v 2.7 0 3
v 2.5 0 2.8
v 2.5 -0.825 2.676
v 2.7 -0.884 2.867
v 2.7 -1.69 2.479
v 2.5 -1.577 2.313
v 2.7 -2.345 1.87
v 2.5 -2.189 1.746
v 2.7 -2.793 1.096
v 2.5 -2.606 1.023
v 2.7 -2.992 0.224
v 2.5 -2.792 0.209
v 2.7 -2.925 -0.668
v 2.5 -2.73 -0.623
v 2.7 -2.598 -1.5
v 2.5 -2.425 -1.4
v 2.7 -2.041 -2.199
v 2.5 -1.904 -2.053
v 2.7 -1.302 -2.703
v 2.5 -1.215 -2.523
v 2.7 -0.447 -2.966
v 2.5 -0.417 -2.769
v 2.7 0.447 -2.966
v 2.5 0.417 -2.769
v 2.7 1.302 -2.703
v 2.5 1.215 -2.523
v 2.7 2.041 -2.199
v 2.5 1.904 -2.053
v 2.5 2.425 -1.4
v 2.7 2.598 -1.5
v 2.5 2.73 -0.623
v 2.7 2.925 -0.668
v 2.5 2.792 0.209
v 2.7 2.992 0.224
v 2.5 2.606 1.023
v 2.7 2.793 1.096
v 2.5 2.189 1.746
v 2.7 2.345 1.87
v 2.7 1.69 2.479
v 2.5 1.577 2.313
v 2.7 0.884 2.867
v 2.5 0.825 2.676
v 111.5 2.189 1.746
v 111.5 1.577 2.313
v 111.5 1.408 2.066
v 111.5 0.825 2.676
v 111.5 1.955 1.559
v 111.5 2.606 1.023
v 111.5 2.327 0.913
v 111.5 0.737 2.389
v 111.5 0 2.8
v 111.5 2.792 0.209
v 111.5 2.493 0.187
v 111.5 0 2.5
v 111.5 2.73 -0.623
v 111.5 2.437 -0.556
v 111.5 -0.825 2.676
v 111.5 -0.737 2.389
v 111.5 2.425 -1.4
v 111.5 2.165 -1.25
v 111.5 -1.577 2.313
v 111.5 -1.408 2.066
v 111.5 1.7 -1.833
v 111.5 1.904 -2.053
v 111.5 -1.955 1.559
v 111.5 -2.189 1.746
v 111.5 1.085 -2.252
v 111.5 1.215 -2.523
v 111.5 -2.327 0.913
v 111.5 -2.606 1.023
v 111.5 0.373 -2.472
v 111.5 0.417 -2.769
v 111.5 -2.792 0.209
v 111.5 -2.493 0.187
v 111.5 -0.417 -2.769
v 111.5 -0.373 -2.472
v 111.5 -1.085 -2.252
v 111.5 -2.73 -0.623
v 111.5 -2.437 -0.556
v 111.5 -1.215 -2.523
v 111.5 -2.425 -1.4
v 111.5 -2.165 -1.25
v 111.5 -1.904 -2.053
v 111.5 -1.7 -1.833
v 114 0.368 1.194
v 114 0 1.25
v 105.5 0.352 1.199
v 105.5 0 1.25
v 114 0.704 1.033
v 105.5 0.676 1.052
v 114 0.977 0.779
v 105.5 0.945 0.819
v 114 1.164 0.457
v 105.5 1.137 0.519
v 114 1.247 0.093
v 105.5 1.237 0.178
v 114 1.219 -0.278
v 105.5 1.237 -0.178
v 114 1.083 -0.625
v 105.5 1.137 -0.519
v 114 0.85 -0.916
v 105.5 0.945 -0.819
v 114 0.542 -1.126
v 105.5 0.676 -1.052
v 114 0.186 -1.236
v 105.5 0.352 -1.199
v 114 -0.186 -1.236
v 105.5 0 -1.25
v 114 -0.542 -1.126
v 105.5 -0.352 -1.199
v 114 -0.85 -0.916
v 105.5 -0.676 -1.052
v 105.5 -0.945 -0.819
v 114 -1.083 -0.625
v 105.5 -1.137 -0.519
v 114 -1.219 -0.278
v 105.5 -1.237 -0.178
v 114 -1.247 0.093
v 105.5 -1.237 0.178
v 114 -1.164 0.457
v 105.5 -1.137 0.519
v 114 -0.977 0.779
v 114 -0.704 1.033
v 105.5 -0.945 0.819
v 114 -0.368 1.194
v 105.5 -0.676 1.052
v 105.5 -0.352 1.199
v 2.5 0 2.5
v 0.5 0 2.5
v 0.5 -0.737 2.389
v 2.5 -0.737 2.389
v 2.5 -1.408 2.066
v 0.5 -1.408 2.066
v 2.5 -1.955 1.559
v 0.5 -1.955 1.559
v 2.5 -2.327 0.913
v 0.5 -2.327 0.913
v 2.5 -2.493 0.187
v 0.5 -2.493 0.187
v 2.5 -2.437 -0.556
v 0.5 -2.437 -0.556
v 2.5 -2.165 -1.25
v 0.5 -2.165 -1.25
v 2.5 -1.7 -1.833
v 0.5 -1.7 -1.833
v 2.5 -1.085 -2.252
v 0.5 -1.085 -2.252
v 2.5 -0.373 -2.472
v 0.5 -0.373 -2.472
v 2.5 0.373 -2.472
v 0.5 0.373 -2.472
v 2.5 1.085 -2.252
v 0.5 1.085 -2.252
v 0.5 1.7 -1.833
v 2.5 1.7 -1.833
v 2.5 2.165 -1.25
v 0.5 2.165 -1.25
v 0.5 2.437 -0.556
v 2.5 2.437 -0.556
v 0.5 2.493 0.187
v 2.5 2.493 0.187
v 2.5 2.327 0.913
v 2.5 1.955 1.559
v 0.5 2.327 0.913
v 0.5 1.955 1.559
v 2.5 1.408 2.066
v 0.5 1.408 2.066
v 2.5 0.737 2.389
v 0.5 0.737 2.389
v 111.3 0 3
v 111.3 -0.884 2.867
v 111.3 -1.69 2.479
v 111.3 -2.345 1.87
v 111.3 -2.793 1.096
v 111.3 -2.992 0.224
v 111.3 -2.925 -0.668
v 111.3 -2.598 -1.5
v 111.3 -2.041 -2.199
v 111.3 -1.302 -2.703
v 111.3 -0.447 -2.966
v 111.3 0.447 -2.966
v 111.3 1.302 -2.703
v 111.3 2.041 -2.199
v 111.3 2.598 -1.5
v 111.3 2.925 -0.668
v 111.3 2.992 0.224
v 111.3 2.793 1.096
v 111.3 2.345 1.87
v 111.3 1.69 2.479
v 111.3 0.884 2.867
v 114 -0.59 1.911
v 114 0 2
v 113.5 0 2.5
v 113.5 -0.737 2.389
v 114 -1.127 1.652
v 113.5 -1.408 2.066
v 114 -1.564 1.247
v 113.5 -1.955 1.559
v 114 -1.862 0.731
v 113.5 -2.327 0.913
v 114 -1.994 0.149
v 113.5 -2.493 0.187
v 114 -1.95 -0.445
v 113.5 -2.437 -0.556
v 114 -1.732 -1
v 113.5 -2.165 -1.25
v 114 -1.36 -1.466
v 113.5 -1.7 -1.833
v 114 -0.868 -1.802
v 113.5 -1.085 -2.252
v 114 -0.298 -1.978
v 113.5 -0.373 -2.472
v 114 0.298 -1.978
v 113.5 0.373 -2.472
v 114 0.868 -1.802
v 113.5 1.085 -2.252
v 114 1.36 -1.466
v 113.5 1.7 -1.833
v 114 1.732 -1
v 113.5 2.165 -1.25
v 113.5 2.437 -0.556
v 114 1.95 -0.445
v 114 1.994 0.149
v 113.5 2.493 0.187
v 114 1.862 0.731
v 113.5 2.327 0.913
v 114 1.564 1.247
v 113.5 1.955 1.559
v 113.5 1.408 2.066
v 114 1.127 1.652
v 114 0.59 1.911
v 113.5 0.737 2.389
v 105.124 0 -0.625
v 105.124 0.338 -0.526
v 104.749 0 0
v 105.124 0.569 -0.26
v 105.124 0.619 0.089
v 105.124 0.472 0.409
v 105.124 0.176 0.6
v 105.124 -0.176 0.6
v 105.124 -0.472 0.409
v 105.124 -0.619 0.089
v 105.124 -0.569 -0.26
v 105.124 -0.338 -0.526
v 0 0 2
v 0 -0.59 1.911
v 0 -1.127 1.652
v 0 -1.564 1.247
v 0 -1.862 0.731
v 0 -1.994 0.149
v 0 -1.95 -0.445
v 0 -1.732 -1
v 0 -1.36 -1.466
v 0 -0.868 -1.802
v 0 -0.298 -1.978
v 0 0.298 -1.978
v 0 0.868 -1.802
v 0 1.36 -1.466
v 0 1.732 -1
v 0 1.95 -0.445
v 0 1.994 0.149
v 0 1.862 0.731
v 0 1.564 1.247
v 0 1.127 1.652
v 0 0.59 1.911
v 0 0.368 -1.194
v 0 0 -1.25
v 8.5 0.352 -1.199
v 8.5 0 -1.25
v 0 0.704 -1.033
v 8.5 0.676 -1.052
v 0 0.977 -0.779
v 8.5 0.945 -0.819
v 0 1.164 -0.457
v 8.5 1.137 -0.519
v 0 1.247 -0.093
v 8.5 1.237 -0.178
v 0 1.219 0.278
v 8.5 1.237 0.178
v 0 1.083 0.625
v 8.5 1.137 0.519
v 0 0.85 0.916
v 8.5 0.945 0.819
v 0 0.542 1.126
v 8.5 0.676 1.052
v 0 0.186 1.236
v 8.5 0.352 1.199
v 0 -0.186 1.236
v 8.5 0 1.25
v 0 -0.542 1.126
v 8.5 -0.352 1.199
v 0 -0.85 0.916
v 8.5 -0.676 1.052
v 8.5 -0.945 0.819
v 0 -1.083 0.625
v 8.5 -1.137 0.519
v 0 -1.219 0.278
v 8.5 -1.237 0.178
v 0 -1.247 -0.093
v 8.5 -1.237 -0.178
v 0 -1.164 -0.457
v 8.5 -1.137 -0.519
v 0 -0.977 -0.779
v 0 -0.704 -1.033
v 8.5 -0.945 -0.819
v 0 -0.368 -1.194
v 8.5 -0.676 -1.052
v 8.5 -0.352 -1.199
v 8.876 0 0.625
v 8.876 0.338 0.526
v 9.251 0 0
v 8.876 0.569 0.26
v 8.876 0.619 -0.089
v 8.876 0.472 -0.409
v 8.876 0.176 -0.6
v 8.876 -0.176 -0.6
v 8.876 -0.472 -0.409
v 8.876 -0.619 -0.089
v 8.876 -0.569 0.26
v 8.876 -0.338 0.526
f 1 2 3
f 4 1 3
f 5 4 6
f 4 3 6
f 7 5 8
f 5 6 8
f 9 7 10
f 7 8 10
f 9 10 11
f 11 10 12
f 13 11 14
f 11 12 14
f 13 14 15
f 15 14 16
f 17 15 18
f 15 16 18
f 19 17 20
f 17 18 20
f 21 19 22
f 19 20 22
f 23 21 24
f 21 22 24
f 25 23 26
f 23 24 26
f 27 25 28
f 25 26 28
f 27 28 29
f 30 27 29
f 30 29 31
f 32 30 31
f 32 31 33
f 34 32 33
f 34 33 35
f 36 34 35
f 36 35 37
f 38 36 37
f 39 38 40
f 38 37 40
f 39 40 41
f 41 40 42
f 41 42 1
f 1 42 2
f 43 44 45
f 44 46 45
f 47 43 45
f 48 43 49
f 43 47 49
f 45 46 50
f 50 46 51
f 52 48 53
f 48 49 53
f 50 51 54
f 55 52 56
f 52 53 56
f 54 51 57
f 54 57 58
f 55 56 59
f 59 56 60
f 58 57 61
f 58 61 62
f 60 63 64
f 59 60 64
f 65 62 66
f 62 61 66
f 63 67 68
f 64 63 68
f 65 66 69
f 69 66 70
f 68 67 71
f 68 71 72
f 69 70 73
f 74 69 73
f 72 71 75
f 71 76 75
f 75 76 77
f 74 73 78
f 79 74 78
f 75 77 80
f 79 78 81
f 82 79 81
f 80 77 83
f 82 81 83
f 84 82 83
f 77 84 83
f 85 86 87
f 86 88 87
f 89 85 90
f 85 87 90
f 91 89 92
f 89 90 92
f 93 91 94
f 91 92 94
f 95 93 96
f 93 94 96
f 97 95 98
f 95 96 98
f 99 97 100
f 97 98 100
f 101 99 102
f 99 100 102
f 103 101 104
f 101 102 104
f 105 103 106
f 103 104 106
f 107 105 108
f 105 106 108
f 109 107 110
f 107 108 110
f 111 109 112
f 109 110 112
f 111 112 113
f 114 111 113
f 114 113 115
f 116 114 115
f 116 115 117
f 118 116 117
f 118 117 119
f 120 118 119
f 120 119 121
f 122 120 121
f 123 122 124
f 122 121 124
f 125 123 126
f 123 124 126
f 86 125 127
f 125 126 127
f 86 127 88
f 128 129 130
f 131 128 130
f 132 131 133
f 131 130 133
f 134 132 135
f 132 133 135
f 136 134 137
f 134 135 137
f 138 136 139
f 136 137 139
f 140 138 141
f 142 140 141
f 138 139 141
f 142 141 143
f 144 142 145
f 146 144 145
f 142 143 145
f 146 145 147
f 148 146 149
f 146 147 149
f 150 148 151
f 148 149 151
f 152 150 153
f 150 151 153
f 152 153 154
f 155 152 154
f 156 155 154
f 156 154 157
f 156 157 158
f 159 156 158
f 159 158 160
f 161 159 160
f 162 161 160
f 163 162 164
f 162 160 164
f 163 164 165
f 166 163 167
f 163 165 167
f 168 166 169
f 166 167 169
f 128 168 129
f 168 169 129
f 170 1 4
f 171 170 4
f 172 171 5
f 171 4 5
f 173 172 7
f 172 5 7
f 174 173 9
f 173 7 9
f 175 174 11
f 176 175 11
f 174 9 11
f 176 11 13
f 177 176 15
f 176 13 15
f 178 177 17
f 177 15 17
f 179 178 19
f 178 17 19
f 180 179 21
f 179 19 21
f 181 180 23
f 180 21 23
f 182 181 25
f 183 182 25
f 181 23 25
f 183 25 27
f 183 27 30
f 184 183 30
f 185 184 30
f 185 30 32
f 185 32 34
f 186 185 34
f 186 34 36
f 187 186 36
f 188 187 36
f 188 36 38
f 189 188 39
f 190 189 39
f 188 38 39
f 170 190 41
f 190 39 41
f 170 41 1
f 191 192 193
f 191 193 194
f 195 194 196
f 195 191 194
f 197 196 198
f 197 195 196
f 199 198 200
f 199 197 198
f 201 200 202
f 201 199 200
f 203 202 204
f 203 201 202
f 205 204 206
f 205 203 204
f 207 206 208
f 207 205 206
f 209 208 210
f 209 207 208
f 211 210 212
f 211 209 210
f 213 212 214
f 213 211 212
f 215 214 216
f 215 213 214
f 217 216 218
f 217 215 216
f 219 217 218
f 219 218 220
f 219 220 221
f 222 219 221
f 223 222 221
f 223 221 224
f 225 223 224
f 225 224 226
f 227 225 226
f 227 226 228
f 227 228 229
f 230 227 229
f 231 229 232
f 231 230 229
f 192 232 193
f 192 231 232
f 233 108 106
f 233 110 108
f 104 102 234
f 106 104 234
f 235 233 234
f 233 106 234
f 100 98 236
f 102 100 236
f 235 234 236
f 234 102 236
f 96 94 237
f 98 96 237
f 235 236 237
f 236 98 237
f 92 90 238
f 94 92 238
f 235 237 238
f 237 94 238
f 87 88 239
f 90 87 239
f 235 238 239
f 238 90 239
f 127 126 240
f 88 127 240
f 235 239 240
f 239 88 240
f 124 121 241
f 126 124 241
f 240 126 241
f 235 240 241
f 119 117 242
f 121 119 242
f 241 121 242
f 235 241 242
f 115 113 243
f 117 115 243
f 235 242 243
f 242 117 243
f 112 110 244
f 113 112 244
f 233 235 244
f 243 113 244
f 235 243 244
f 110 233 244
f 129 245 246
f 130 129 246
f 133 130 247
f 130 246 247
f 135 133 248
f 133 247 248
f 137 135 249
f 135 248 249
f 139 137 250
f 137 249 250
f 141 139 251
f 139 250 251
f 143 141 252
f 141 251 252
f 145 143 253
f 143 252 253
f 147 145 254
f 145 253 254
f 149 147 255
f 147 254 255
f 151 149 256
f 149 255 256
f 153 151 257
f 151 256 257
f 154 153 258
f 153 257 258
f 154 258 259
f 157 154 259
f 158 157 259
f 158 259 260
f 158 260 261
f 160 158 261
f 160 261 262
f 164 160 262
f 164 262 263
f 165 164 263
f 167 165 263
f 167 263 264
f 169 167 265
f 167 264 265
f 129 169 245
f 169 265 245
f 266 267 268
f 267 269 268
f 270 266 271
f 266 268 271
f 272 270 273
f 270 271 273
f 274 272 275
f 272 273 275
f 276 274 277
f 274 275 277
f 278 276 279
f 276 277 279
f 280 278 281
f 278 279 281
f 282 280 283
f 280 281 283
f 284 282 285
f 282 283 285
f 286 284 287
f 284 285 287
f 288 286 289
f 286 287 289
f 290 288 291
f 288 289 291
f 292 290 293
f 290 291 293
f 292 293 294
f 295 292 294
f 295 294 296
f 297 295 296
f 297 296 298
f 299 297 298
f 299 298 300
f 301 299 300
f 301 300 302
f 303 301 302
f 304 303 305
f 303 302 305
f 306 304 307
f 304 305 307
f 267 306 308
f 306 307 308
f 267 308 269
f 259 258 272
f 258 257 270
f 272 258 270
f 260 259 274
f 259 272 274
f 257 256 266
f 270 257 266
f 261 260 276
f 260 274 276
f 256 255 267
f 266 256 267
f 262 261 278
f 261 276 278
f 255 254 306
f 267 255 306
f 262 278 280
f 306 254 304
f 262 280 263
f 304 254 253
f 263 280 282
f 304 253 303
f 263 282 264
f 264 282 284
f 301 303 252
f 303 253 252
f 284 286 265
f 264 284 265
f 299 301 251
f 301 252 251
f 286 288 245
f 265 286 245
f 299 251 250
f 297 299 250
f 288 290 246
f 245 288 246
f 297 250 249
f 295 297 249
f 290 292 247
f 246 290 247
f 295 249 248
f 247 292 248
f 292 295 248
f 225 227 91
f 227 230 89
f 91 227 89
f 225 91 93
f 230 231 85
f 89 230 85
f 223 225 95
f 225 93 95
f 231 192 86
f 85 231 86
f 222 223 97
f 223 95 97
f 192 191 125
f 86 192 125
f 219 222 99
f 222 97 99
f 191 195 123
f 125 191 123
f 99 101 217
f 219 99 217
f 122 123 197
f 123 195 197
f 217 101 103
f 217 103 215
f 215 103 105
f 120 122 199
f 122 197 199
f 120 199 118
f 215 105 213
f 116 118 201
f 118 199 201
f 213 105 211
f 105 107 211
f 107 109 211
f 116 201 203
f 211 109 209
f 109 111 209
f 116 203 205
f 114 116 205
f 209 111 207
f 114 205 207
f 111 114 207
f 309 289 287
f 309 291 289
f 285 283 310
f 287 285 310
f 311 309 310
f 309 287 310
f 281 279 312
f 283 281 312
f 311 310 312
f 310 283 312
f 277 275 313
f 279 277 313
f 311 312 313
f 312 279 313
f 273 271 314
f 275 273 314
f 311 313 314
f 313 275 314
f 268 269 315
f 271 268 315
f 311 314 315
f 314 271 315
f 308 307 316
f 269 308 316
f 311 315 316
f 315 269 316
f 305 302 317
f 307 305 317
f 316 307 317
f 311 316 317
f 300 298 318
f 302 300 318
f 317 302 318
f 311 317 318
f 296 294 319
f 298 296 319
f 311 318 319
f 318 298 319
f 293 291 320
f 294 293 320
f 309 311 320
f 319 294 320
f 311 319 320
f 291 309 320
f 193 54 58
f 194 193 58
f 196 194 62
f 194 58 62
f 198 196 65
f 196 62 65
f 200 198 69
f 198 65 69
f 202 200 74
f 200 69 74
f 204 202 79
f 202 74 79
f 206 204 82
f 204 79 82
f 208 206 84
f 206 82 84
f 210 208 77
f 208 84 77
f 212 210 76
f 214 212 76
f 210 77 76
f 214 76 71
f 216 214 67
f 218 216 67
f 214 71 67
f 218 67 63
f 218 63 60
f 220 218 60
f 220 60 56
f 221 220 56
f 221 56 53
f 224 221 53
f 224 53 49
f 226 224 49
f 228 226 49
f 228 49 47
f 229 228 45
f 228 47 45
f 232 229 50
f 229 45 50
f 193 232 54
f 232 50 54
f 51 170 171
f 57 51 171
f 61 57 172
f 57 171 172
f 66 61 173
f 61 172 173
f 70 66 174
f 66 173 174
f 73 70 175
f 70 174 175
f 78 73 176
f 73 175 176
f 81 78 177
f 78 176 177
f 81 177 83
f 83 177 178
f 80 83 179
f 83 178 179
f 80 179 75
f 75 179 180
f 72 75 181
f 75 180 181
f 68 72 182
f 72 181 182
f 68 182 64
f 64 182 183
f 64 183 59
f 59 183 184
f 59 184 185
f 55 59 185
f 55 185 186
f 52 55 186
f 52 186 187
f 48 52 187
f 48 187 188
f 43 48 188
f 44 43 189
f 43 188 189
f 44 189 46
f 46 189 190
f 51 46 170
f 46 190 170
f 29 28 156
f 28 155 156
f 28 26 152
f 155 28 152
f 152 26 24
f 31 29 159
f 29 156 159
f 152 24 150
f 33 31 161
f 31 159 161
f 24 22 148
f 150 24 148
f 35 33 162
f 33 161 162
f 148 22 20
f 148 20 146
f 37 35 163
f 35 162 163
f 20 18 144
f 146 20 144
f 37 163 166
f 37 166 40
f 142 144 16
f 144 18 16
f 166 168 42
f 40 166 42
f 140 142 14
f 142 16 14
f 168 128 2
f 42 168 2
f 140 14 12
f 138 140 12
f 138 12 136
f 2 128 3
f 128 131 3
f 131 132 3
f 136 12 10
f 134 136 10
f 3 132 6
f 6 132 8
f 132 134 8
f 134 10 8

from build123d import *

# Parameters (mm, degrees)
TAPPED_HOLE1_D     = 2.5
TAPPED_HOLE1_DEPTH = 8.5
TAPPED_HOLE1_TIP   = 0.751075774
TAPPED_HOLE2_D     = 2.5
TAPPED_HOLE2_DEPTH = 8.5
TAPPED_HOLE2_TIP   = 0.751075774
CHAMFER1_SIZE      = 0.2
CHAMFER2_SIZE      = 0.2
CHAMFER3_SIZE      = 0.5


with BuildPart() as part:
    # Sketch1 → Revolve1 (revolve)
    with BuildSketch(Plane.XY):
        Polygon((0, 0), (114, 0), (114, 2.5), (111.5, 2.5), (111.5, 3), (2.5, 3), (2.5, 2.5), (0, 2.5), align=None)
    revolve(axis=Axis((0, 0, 0), (1, 0, 0)))

    # Tapped Hole1
    with Locations(Plane.ZY):
        with Locations((0, 0)):
            Hole(TAPPED_HOLE1_D / 2, depth=TAPPED_HOLE1_DEPTH)
            with Locations((0, 0, -(TAPPED_HOLE1_DEPTH + TAPPED_HOLE1_TIP / 2))):  # 118° drill point
                Cone(0, TAPPED_HOLE1_D / 2, TAPPED_HOLE1_TIP, mode=Mode.SUBTRACT)

    # Tapped Hole2
    with Locations(Plane(origin=(114, 0, 0), x_dir=(0, 0, -1), z_dir=(1, 0, 0))):
        with Locations((0, 0)):
            Hole(TAPPED_HOLE2_D / 2, depth=TAPPED_HOLE2_DEPTH)
            with Locations((0, 0, -(TAPPED_HOLE2_DEPTH + TAPPED_HOLE2_TIP / 2))):  # 118° drill point
                Cone(0, TAPPED_HOLE2_D / 2, TAPPED_HOLE2_TIP, mode=Mode.SUBTRACT)

    # Chamfer1
    chamfer1_edges = [part.edges().sort_by_distance(p)[0] for p in [
        (111.5, -3, 0),
    ]]
    chamfer(chamfer1_edges, length=CHAMFER1_SIZE)

    # Chamfer2
    chamfer2_edges = [part.edges().sort_by_distance(p)[0] for p in [
        (2.5, -3, 0),
    ]]
    chamfer(chamfer2_edges, length=CHAMFER2_SIZE)

    # Chamfer3
    chamfer3_edges = [part.edges().sort_by_distance(p)[0] for p in [
        (114, -2.5, 0),
        (0, -2.5, 0),
    ]]
    chamfer(chamfer3_edges, length=CHAMFER3_SIZE)


solid = part.part
